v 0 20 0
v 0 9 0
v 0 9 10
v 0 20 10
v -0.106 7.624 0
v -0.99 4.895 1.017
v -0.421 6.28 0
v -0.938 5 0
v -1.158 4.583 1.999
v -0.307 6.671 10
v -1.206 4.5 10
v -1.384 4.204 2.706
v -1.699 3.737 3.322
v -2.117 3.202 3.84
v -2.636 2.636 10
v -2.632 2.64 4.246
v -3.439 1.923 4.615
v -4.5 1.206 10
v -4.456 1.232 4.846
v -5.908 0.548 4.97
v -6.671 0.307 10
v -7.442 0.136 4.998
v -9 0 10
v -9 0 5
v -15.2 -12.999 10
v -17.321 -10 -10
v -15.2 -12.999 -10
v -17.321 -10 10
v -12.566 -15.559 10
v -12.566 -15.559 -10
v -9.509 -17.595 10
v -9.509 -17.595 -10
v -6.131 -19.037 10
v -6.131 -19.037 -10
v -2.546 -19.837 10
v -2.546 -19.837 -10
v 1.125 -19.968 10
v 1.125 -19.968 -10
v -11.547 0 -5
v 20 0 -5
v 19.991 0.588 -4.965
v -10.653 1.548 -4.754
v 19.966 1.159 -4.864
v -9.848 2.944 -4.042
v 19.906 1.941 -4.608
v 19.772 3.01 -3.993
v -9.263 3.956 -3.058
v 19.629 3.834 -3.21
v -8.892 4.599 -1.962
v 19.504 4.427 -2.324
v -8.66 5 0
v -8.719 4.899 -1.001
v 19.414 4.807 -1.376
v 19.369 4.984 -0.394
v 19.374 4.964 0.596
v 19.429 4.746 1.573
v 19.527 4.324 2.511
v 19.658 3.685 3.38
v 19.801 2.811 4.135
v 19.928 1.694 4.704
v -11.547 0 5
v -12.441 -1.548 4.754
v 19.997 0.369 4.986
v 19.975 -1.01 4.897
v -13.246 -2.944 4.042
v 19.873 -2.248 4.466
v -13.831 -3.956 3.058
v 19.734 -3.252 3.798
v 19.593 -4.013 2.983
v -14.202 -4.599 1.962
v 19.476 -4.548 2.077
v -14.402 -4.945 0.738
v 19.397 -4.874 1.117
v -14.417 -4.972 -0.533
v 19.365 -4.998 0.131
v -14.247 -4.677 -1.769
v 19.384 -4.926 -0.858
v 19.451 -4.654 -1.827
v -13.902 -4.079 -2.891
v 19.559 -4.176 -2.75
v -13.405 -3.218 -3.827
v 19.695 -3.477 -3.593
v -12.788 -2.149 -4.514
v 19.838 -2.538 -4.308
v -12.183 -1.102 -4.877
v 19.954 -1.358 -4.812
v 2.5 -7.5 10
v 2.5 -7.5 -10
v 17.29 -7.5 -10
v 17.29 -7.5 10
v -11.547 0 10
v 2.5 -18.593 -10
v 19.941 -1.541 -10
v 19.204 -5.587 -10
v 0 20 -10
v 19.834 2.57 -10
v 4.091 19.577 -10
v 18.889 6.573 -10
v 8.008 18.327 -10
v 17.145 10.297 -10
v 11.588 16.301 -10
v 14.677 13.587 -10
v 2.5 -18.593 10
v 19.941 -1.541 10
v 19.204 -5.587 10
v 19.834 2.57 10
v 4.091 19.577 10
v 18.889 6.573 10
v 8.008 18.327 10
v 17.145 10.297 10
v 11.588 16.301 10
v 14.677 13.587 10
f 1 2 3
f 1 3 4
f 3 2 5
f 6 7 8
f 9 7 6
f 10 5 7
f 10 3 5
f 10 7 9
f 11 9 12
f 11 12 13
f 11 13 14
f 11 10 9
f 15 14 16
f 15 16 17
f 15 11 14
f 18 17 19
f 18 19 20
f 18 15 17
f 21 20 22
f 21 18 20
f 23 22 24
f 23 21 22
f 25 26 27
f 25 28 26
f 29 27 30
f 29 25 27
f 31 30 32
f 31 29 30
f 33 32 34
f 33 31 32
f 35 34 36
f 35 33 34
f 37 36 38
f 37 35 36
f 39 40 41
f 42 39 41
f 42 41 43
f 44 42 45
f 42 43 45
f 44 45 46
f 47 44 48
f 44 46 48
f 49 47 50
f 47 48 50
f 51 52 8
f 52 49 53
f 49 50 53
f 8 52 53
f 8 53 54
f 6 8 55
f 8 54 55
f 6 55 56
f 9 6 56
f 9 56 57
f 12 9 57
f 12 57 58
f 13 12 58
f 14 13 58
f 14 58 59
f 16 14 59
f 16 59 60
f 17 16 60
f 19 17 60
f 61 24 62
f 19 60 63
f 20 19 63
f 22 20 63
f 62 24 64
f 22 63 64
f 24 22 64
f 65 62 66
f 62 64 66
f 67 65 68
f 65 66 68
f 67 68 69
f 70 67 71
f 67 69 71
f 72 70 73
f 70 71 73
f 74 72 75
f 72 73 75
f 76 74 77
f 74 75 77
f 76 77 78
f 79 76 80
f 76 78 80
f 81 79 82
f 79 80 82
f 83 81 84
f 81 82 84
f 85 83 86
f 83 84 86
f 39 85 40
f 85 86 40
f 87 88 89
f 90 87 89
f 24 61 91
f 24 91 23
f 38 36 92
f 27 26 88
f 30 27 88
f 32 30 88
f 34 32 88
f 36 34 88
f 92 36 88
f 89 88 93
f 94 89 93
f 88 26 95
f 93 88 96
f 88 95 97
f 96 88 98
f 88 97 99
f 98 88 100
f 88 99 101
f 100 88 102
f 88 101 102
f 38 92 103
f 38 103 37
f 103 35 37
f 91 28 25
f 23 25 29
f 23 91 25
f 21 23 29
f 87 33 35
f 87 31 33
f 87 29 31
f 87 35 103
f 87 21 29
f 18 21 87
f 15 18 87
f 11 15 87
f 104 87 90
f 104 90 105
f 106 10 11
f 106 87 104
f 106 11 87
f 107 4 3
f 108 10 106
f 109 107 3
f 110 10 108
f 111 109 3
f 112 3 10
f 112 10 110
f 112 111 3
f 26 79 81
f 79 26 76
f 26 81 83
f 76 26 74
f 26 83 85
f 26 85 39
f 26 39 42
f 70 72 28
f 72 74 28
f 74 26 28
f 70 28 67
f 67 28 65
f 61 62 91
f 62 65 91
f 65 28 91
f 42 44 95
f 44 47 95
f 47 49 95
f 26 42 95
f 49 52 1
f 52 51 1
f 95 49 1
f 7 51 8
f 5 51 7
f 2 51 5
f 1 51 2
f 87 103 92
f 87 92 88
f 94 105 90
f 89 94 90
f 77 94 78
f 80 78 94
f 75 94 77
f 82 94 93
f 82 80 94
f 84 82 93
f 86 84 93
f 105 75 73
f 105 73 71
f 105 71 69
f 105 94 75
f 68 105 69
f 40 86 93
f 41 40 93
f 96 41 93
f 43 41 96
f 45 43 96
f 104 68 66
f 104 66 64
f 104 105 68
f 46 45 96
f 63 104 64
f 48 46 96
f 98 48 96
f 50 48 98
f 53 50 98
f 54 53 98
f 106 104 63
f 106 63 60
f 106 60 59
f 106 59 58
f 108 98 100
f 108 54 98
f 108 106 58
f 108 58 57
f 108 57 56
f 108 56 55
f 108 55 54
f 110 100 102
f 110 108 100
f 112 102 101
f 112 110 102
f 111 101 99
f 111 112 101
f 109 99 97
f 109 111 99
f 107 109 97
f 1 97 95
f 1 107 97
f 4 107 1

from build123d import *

# Parameters (mm, degrees)
SKETCH1_R           = 20
BOSS_EXTRUDE1_DEPTH = 10
CUT_EXTRUDE1_DEPTH  = 33
SKETCH5_W           = 27.400462
SKETCH5_H           = 25.39372
CUT_EXTRUDE3_DEPTH  = 66
FILLET1_R           = 9
SKETCH6_W           = 26.303109
SKETCH6_H           = 19.36506
CUT_EXTRUDE4_DEPTH  = 33
CHAMFER1_SIZE       = 1.25
CHAMFER2_SIZE       = 1.25
SKETCH7_R           = 5
CUT_EXTRUDE5_DEPTH  = 33


with BuildPart() as part:
    # Sketch1 → Boss-Extrude1 (new, symmetric)
    with BuildSketch(Plane.XY):
        Circle(SKETCH1_R)
    extrude(amount=BOSS_EXTRUDE1_DEPTH, both=True)

    # Sketch2 → Cut-Extrude1 (cut, symmetric)
    with BuildSketch(Plane.XY.offset(10)):
        Polygon((0, 20), (0, 24.336587), (-29.859429, 24.336587), (-29.859429, -31.718049), align=None)
    extrude(amount=CUT_EXTRUDE1_DEPTH, both=True, mode=Mode.SUBTRACT)

    # Sketch5 → Cut-Extrude3 (cut)
    with BuildSketch(Plane.XY):
        with Locations((-13.700231, 12.69686)):
            Rectangle(SKETCH5_W, SKETCH5_H)
    extrude(amount=CUT_EXTRUDE3_DEPTH, mode=Mode.SUBTRACT)

    # Fillet1
    fillet1_edges = [part.edges().sort_by_distance(p)[0] for p in [
        (0, 0, 5),
    ]]
    fillet(fillet1_edges, radius=FILLET1_R)

    # Sketch6 → Cut-Extrude4 (cut, symmetric)
    with BuildSketch(Plane.XY):
        with Locations((15.651554, -17.18253)):
            Rectangle(SKETCH6_W, SKETCH6_H)
    extrude(amount=CUT_EXTRUDE4_DEPTH, both=True, mode=Mode.SUBTRACT)

    # Chamfer1
    # the kernel refuses this chamfer: 1.441493, 1.25 mm, written as the material it takes off along each edge
    with BuildSketch(Plane(origin=(2.5, -19.843135, -13.564195), x_dir=(0, 1, 0), z_dir=(0, 0, 1))) as chamfer1_piece_1:
        with BuildLine():
            Line((CHAMFER1_SIZE, 0), (-0.125211, 1.375211))
            ThreePointArc((-0.125211, 1.375211), (-0.076474, 0.708578), (0, 0))
            Line((0, 0), (CHAMFER1_SIZE, 0))
        make_face()
    extrude(amount=27.128391, mode=Mode.SUBTRACT)

    # Chamfer2
    # the kernel refuses this chamfer: 2.264391, 1.25 mm, written as the material it takes off along each edge
    with BuildSketch(Plane(origin=(18.540496, -7.5, -15.267547), x_dir=(0.32758486719281943, 0.944821758209591, 0), z_dir=(0, 0, 1))) as chamfer2_piece_1:
        with BuildLine():
            Line((2.025154, 0), (-CHAMFER2_SIZE * 0.327584867193, CHAMFER2_SIZE * 0.94482175821))
            Line((-CHAMFER2_SIZE * 0.327584867193, CHAMFER2_SIZE * 0.94482175821), (0, 0))
            ThreePointArc((0, 0), (1.053336, -0.025608), (2.025154, 0))
        make_face()
    extrude(amount=30.535093, mode=Mode.SUBTRACT)

    # Sketch7 → Cut-Extrude5 (cut, symmetric)
    with BuildSketch(Plane(origin=(0, 0, 0), x_dir=(0, 0, -1), z_dir=(1, 0, 0))):
        Circle(SKETCH7_R)
    extrude(amount=CUT_EXTRUDE5_DEPTH, both=True, mode=Mode.SUBTRACT)


solid = part.part
